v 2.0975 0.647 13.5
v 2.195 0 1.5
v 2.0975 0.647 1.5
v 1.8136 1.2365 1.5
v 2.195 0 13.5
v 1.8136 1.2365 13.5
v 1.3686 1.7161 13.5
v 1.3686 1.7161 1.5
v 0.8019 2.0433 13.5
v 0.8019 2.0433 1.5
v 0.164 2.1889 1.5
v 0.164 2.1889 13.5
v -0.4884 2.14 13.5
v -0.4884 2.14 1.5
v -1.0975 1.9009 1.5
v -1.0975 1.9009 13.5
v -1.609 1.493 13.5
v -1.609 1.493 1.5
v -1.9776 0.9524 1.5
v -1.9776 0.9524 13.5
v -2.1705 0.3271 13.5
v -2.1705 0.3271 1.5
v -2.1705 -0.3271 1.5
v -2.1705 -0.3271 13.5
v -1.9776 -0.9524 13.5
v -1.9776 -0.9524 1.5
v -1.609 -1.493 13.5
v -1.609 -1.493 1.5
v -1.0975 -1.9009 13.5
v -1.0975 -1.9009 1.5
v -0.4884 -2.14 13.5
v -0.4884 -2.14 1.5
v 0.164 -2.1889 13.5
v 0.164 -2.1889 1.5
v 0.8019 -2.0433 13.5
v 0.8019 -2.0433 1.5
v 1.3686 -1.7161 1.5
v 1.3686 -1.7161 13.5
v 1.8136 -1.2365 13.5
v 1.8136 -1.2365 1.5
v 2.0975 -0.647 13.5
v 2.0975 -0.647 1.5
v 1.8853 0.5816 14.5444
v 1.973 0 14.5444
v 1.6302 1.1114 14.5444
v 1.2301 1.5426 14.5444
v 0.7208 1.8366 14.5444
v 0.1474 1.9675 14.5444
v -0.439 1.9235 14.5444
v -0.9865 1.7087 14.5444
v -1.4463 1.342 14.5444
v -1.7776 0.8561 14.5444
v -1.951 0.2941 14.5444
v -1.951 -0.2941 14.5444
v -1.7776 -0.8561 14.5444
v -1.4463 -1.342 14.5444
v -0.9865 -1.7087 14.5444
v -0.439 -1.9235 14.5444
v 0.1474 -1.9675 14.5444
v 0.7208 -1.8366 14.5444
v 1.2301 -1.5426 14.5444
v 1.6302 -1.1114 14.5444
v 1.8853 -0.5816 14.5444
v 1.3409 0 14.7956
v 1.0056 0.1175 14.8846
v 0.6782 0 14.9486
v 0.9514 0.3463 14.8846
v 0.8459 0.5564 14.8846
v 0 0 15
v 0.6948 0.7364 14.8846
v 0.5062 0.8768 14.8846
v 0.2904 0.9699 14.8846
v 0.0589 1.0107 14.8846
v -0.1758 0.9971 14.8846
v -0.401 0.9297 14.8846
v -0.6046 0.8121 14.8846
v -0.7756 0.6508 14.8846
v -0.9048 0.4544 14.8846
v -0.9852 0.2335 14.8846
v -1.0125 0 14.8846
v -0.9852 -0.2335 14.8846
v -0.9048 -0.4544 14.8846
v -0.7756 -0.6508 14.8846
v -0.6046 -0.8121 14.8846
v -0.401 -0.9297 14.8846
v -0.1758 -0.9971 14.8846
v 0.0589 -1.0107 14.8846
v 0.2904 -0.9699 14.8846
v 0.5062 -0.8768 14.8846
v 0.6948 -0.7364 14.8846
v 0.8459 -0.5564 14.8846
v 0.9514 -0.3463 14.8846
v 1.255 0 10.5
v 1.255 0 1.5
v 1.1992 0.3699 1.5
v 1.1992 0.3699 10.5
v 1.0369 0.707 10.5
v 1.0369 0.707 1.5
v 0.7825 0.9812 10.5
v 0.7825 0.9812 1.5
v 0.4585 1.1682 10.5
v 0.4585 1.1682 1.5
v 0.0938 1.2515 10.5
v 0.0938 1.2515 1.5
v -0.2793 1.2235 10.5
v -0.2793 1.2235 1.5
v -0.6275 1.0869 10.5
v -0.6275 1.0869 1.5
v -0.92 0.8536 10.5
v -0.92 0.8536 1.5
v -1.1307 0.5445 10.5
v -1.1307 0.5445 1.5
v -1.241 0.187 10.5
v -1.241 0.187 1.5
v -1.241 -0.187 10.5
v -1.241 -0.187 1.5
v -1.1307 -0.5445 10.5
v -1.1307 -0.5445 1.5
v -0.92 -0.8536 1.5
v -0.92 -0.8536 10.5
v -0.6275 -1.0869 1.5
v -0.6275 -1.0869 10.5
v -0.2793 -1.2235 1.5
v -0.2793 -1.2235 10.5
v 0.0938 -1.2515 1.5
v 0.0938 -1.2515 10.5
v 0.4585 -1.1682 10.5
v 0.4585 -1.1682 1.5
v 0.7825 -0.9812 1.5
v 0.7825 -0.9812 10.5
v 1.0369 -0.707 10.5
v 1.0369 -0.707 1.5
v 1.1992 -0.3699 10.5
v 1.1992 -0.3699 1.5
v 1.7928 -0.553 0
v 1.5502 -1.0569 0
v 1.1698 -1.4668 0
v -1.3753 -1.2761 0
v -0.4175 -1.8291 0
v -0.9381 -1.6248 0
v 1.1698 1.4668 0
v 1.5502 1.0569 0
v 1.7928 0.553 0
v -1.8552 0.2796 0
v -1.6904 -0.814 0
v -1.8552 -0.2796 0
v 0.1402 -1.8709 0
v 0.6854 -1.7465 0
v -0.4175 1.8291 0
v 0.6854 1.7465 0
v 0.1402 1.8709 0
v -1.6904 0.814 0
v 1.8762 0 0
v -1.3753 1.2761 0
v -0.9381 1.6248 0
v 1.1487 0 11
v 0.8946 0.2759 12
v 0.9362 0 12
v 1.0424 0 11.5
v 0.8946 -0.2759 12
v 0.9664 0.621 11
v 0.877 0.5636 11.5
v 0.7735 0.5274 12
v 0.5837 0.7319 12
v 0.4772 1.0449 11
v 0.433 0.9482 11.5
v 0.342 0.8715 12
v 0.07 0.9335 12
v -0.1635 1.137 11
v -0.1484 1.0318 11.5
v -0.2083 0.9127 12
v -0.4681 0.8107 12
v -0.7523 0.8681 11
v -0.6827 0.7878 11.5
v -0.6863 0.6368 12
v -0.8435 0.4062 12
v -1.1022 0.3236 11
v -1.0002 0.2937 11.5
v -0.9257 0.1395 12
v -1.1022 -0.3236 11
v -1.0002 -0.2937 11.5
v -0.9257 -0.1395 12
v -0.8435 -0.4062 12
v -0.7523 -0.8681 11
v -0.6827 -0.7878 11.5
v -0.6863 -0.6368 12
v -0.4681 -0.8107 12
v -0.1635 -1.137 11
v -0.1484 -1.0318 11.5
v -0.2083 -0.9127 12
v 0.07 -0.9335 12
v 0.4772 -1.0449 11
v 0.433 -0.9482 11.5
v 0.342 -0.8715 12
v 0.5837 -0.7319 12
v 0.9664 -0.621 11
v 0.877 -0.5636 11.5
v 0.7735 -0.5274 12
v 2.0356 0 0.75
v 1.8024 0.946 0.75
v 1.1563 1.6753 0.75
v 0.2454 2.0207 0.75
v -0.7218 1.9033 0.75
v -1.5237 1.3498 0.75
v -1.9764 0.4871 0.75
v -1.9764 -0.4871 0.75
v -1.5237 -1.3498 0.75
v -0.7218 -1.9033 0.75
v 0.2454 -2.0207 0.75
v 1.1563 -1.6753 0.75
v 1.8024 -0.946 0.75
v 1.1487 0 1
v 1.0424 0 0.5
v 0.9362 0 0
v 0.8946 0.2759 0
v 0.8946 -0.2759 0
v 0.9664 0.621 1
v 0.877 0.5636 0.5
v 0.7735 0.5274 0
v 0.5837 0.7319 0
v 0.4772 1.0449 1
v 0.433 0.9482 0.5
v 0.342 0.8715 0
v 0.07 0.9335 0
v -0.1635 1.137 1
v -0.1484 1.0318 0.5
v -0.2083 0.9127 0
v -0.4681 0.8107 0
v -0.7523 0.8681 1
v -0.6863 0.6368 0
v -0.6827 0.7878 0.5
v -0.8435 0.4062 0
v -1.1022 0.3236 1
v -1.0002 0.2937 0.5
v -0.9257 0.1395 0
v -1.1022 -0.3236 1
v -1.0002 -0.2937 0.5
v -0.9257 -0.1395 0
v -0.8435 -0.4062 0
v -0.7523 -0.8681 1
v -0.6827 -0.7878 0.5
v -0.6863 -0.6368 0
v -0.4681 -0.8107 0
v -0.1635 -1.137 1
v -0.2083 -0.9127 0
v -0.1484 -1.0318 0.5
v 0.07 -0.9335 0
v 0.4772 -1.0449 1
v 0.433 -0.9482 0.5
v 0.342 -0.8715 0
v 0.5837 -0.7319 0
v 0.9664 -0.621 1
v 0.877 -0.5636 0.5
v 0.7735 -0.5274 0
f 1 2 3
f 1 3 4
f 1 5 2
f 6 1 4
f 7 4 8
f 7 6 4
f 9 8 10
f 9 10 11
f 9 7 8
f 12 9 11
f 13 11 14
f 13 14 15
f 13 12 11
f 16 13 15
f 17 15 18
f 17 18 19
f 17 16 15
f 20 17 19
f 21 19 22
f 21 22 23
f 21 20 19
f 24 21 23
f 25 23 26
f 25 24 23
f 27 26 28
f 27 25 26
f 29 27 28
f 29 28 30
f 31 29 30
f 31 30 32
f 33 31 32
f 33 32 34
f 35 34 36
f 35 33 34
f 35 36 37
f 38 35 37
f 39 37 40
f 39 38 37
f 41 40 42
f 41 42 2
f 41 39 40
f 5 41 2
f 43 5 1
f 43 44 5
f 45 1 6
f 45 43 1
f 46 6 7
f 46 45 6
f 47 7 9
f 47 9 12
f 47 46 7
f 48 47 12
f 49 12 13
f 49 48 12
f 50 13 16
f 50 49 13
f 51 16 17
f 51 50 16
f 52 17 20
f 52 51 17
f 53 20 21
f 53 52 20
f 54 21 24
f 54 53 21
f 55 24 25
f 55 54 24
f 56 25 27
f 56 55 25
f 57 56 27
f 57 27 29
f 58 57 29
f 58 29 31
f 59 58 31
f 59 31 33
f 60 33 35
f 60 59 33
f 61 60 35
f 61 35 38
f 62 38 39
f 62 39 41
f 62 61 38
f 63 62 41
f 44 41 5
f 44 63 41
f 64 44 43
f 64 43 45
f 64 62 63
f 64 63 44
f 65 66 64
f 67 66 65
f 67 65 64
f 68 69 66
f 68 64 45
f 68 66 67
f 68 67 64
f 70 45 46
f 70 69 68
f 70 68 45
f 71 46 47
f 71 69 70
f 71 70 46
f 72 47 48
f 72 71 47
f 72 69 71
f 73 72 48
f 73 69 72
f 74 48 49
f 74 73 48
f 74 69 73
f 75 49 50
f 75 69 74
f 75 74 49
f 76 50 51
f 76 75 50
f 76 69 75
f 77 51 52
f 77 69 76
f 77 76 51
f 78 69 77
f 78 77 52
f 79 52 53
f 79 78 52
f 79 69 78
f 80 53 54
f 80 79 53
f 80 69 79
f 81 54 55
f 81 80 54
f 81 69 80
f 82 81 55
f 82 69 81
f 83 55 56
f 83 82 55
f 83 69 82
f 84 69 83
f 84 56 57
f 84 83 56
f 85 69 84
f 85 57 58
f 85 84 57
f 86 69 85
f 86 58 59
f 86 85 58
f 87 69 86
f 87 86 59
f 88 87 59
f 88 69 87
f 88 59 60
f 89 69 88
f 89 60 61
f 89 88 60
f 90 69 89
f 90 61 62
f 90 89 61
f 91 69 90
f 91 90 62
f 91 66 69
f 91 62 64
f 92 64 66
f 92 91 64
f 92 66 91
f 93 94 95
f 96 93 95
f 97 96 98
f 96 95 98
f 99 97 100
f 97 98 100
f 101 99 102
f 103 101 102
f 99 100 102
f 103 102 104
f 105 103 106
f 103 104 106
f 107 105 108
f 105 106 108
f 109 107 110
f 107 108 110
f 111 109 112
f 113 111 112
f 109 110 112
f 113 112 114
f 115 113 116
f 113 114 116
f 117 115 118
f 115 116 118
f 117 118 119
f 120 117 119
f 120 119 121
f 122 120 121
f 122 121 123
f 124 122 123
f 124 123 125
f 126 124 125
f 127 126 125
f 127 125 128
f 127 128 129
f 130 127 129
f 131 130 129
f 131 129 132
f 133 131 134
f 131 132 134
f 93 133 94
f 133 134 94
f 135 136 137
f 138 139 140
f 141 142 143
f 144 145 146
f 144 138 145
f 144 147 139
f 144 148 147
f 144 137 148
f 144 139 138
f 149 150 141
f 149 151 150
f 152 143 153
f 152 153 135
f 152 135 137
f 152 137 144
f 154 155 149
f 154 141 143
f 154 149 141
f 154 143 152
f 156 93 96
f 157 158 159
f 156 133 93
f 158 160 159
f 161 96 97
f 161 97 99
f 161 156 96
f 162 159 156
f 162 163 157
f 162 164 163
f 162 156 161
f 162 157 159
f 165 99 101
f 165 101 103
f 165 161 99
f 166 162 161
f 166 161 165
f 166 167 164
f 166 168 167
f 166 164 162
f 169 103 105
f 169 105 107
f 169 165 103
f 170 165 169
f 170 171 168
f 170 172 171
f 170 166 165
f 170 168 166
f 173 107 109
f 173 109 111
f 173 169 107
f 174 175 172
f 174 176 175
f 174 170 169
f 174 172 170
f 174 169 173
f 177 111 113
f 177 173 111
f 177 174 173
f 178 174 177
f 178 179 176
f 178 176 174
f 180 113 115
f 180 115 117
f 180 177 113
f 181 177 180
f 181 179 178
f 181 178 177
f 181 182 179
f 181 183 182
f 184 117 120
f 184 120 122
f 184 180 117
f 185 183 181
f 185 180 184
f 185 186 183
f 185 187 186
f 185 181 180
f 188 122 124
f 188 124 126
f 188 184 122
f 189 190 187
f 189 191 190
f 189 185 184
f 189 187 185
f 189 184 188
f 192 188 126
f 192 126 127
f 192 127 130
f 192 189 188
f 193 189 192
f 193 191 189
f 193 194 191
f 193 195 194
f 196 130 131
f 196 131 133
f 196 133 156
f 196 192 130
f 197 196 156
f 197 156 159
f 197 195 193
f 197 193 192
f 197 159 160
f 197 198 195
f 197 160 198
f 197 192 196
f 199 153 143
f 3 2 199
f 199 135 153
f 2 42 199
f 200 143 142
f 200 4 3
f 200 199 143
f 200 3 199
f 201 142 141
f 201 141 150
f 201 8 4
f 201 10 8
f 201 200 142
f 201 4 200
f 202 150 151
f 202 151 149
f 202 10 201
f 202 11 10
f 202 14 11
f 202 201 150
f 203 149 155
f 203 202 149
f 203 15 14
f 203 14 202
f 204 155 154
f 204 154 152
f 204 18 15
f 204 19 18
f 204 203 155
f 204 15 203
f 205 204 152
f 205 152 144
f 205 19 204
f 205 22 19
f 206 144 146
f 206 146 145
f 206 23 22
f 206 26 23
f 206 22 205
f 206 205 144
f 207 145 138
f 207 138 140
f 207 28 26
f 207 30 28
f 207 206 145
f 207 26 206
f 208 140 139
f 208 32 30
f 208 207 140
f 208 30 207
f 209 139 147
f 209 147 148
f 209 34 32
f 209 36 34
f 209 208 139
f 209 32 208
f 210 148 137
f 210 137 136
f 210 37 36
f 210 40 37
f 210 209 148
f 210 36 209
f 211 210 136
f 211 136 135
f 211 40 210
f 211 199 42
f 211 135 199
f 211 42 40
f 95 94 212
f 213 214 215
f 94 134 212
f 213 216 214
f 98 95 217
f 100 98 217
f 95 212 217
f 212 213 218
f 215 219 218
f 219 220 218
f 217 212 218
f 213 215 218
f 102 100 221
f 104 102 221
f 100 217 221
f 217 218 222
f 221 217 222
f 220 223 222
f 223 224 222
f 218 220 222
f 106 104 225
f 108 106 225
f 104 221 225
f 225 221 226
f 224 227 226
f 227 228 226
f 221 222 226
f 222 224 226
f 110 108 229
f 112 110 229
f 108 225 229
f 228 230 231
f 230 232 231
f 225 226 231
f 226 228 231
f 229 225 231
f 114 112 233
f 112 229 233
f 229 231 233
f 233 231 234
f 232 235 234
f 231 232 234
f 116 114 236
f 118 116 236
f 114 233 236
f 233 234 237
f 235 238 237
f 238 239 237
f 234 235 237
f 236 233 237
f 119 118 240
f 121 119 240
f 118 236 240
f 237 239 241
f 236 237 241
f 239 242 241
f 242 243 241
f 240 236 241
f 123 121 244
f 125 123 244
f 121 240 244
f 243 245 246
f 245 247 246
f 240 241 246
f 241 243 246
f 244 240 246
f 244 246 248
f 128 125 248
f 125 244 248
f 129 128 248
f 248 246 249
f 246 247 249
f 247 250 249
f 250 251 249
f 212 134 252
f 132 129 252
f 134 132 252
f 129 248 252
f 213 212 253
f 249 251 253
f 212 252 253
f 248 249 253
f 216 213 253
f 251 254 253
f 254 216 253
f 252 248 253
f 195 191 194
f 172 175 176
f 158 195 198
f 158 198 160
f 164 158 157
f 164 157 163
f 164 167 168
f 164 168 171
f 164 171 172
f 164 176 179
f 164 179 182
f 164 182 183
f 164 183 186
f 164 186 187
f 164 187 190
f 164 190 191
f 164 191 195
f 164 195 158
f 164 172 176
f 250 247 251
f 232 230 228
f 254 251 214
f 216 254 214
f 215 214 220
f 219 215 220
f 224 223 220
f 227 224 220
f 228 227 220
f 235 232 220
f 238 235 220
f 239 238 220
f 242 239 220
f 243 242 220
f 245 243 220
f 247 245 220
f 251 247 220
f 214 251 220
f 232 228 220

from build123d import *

# Parameters (mm, degrees)
F0_R     = 0.4183333333
F1_DEPTH = 4
F2_SIZE2 = 0.1062782808
F2_SIZE  = 0.5
F5_SCALE = 3


with BuildPart() as f1:
    # F0 (on Top) → F1 (new body)
    with BuildSketch(Plane.XY):
        Circle(F0_R)
    extrude(amount=F1_DEPTH)

    # F2
    f2_edges = [f1.edges().sort_by_distance(p)[0] for p in [
        (-0.418333, 0, 4),
        (-0.418333, 0, 0),
    ]]
    f2_side = f1.faces().sort_by_distance((-0.418333, 0, 2))[0]
    chamfer(f2_edges, length=F2_SIZE, length2=F2_SIZE2, reference=f2_side)


with BuildPart() as f4:
    # F3 (on Front) → F4 (revolve)
    with BuildSketch(Plane.XZ):
        with BuildLine():
            Line((0, 5), (0, 0))
            Line((0, 0), (0.6253883858, 0))
            Line((0.6253883858, 0), (0.7316666667, 0.5))
            Line((0.7316666667, 0.5), (0.7316666667, 4.5))
            Line((0.7316666667, 4.5), (0.6576678971, 4.8481368391))
            ThreePointArc((0.6576678971, 4.8481368391), (0.3374868451, 4.9615411829), (0, 5))
        make_face()
    revolve(axis=Axis((0, 0, 2.5), (0, 0, 1)))


with BuildPart() as f1_1:
    # F5: moved
    add(f1.part.scale(F5_SCALE))


with BuildPart() as f4_1:
    # F5: moved
    add(f4.part.scale(F5_SCALE))


solid = Compound([f1_1.part, f4_1.part])
